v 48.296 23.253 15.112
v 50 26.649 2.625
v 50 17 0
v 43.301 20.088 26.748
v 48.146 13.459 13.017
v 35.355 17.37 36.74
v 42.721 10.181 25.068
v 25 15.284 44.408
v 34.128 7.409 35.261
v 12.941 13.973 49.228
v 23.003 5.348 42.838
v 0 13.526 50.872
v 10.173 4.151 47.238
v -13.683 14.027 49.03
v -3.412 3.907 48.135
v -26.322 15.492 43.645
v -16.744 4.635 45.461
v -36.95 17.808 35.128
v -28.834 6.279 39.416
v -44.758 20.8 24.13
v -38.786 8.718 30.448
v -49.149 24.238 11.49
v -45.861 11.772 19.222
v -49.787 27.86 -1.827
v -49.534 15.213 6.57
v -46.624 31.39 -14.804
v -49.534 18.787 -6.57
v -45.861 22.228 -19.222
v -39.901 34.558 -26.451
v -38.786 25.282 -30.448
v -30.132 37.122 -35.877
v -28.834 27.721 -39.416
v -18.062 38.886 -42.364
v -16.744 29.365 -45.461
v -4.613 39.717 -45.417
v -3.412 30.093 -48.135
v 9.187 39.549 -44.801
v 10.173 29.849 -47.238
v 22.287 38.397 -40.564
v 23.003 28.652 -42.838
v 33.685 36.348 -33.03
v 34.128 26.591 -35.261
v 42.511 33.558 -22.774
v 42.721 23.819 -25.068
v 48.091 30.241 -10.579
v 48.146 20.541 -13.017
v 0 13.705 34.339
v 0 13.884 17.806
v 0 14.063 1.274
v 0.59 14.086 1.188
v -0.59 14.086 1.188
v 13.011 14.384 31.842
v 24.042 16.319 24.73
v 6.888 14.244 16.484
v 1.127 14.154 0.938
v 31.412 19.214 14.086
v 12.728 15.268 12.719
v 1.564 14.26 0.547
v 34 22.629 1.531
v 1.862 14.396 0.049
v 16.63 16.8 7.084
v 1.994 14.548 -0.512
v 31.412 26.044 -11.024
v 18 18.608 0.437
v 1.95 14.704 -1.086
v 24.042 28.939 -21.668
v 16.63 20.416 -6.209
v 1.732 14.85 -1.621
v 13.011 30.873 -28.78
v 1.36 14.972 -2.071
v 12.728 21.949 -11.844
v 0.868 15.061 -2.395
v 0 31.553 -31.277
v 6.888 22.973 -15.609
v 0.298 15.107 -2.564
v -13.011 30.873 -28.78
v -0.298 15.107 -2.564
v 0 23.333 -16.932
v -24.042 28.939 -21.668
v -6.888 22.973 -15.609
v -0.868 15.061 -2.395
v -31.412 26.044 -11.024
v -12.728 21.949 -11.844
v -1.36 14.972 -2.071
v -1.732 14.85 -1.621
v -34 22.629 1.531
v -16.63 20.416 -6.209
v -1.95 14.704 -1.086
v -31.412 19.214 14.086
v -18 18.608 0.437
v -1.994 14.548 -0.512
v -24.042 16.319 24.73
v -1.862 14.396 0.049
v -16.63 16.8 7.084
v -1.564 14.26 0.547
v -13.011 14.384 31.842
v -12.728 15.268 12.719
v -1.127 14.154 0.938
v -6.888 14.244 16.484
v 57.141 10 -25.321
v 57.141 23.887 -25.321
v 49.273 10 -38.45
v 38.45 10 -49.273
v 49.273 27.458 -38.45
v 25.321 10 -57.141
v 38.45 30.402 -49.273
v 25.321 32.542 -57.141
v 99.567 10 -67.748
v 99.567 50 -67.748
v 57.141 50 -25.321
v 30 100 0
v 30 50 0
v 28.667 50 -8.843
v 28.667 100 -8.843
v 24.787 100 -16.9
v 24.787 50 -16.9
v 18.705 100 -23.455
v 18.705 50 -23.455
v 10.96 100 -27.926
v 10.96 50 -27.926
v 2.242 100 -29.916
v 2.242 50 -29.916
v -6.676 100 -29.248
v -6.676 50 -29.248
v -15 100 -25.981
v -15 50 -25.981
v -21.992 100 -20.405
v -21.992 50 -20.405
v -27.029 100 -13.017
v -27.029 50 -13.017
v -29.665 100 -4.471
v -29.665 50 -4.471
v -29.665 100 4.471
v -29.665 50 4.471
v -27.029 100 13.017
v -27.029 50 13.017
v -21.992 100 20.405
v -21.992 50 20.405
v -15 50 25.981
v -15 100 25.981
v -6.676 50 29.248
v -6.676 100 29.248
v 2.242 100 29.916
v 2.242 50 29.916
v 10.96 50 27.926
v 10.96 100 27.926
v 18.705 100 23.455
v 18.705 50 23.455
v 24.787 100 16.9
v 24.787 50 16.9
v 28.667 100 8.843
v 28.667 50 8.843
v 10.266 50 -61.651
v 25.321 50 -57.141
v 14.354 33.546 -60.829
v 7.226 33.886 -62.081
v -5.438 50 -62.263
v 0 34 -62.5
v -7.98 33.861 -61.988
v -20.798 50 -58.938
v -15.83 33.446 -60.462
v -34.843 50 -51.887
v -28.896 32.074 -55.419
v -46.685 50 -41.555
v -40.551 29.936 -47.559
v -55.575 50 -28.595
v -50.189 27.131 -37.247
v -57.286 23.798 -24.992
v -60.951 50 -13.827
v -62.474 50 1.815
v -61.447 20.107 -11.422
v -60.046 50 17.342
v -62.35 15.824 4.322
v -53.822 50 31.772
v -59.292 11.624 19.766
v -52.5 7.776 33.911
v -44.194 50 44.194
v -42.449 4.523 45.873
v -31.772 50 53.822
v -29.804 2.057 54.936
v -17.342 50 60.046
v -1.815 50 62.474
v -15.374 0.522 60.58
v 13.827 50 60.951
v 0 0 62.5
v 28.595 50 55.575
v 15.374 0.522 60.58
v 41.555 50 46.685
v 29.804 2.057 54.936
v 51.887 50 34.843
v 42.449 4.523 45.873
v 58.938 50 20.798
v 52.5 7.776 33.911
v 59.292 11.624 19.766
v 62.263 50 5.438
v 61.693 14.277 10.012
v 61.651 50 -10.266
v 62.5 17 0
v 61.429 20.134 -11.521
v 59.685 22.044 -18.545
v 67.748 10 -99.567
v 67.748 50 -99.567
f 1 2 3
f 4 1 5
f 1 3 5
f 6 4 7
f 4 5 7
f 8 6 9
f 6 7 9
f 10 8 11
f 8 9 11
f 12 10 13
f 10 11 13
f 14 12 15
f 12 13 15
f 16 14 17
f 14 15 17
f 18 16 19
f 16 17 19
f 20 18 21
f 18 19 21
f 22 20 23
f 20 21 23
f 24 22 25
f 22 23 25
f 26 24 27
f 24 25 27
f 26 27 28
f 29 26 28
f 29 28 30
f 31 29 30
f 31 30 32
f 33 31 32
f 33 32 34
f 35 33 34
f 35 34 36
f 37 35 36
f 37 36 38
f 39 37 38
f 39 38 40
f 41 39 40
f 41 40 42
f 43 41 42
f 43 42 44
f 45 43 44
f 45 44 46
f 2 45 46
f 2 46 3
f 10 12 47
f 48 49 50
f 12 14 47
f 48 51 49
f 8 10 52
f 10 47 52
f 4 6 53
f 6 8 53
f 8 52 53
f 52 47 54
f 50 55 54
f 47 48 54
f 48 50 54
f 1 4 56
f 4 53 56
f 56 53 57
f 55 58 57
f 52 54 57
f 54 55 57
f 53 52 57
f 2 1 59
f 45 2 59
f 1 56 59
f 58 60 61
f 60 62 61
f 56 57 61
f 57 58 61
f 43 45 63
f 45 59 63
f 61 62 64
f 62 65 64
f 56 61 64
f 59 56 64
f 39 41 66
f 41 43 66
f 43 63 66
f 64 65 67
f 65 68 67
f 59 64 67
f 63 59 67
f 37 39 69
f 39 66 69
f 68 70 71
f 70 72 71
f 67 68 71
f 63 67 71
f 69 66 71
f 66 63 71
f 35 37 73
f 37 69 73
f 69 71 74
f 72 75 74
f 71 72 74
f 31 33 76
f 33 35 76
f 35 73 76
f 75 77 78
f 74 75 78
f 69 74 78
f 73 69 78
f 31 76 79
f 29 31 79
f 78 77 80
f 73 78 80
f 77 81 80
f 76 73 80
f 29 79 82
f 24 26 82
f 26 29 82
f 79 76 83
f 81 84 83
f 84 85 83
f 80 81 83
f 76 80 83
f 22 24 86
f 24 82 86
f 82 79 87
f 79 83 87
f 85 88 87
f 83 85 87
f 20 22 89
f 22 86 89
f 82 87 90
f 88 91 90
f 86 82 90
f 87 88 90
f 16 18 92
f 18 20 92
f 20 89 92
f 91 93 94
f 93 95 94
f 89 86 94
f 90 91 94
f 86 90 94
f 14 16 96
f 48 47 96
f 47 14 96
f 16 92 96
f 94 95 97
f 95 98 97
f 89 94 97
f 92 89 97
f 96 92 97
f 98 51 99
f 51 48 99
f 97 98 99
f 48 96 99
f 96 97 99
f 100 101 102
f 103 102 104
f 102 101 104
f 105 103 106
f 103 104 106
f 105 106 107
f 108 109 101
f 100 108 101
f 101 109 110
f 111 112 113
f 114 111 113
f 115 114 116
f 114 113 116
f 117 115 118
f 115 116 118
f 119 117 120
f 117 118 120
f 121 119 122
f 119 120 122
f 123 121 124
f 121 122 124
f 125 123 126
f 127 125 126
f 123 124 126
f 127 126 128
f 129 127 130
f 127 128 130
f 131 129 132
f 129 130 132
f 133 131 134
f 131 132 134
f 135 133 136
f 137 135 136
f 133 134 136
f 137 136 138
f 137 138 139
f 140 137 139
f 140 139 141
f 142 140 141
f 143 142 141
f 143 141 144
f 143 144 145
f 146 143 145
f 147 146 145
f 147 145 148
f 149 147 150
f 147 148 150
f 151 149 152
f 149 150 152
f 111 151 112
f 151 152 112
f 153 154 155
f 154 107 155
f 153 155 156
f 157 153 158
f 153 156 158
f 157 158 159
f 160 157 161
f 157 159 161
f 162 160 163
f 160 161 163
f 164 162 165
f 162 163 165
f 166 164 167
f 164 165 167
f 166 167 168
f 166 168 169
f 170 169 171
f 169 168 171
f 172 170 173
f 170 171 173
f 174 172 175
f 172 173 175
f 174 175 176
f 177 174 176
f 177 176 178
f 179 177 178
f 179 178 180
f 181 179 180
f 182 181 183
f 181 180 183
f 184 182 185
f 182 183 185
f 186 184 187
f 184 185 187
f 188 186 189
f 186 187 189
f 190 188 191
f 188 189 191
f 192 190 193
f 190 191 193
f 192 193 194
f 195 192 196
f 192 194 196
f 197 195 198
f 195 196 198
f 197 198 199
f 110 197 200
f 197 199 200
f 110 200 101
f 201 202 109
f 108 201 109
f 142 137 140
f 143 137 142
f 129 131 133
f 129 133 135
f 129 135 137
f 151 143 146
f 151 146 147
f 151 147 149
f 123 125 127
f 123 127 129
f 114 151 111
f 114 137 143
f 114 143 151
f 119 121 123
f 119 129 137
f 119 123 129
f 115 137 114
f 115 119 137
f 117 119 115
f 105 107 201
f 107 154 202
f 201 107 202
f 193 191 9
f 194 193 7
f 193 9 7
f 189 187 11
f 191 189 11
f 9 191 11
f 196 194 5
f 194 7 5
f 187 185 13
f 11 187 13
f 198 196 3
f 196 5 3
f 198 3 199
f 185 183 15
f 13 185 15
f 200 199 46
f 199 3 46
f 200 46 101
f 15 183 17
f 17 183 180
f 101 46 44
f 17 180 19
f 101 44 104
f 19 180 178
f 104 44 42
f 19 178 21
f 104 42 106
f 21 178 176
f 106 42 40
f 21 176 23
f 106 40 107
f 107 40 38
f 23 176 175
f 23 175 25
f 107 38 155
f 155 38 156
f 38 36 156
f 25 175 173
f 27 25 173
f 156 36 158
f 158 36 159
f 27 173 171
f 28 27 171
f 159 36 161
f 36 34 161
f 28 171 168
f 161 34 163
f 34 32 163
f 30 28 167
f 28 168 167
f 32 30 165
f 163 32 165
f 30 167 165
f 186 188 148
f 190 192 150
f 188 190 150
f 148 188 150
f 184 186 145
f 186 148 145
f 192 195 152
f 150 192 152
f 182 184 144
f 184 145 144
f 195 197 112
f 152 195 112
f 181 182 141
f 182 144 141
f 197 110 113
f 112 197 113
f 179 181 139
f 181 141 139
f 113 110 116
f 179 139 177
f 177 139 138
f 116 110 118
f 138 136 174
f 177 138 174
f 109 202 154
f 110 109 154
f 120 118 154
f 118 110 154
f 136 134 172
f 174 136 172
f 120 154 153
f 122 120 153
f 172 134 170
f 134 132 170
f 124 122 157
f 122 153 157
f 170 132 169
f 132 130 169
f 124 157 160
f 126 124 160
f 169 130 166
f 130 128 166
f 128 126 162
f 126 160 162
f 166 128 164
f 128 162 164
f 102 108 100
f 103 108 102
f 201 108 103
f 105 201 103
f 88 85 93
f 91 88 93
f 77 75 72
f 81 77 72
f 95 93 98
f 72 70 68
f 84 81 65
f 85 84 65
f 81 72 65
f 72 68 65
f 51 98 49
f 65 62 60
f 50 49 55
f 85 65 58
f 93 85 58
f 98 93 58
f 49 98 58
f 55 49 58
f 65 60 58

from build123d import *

# Parameters (mm, degrees)
SKETCH2_R               = 62.5
BOSS_EXTRUDE1_DEPTH     = 50
CUT_EXTRUDE1_DEPTH      = 63.5
CUT_EXTRUDE1_DEPTH_BACK = 63.5
SKETCH4_R               = 30
BOSS_EXTRUDE2_DEPTH     = 50
SKETCH5_R               = 50
CUT_EXTRUDE2_DEPTH      = 33.808019269
CUT_EXTRUDE2_DEPTH_BACK = 10
BOSS_EXTRUDE3_DEPTH     = 40


with BuildPart() as part:
    # Sketch2 → Boss-Extrude1 (new body)
    with BuildSketch(Plane(origin=(0, 0, 0), x_dir=(1, 0, 0), z_dir=(0, 1, 0))):
        Circle(SKETCH2_R)
    extrude(amount=BOSS_EXTRUDE1_DEPTH)

    # Sketch3 → Cut-Extrude1 (cut, two sides)
    with BuildSketch(Plane(origin=(0, 0, 0), x_dir=(0, 0, -1), z_dir=(1, 0, 0))) as cut_extrude1_sk:
        Polygon((-62.5, 0), (62.5, 34), (62.5, 0), align=None)
    extrude(amount=CUT_EXTRUDE1_DEPTH, mode=Mode.SUBTRACT)
    extrude(cut_extrude1_sk.sketch, amount=-CUT_EXTRUDE1_DEPTH_BACK, mode=Mode.SUBTRACT)

    # Sketch4 → Boss-Extrude2 (add)
    with BuildSketch(Plane(origin=(0, 50, 0), x_dir=(1, 0, 0), z_dir=(0, 1, 0))):
        Circle(SKETCH4_R)
    extrude(amount=BOSS_EXTRUDE2_DEPTH)

    # Sketch5 → Cut-Extrude2 (cut, two sides)
    with BuildSketch(Plane(origin=(0, 15.828913652, 4.305464513), x_dir=(1, 0, 0), z_dir=(0, -0.964941743, -0.262464154))) as cut_extrude2_sk:
        with Locations((0, -4.461890621)):
            Circle(SKETCH5_R)
    extrude(amount=CUT_EXTRUDE2_DEPTH, mode=Mode.SUBTRACT)
    extrude(cut_extrude2_sk.sketch, amount=-CUT_EXTRUDE2_DEPTH_BACK, mode=Mode.SUBTRACT)

    # Sketch7 → Revolve1 (revolve)
    with BuildSketch(Plane(origin=(0, 0, 0), x_dir=(0, 0, -1), z_dir=(1, 0, 0))):
        Polygon((-50.871728702, 13.526209724), (-1.273723101, 14.062717334), (0.656160385, 14.587645642), (-2.624641542, 26.649417432), align=None)
    revolve(axis=Axis((0, 14.587645642, -0.656160385), (0, 0.964941743, 0.262464154)))

    # Sketch8 → Boss-Extrude3 (add)
    with BuildSketch(Plane(origin=(0, 50, 0), x_dir=(1, 0, 0), z_dir=(0, 1, 0))):
        with BuildLine():
            Line((25.321153679, 57.140958833), (67.747560551, 99.567365704))
            Line((67.747560551, 99.567365704), (99.567365704, 67.747560551))
            Line((99.567365704, 67.747560551), (57.140958833, 25.321153679))
            ThreePointArc((57.140958833, 25.321153679), (44.194173824, 44.194173824), (25.321153679, 57.140958833))
        make_face()
    extrude(amount=-BOSS_EXTRUDE3_DEPTH)


solid = part.part
